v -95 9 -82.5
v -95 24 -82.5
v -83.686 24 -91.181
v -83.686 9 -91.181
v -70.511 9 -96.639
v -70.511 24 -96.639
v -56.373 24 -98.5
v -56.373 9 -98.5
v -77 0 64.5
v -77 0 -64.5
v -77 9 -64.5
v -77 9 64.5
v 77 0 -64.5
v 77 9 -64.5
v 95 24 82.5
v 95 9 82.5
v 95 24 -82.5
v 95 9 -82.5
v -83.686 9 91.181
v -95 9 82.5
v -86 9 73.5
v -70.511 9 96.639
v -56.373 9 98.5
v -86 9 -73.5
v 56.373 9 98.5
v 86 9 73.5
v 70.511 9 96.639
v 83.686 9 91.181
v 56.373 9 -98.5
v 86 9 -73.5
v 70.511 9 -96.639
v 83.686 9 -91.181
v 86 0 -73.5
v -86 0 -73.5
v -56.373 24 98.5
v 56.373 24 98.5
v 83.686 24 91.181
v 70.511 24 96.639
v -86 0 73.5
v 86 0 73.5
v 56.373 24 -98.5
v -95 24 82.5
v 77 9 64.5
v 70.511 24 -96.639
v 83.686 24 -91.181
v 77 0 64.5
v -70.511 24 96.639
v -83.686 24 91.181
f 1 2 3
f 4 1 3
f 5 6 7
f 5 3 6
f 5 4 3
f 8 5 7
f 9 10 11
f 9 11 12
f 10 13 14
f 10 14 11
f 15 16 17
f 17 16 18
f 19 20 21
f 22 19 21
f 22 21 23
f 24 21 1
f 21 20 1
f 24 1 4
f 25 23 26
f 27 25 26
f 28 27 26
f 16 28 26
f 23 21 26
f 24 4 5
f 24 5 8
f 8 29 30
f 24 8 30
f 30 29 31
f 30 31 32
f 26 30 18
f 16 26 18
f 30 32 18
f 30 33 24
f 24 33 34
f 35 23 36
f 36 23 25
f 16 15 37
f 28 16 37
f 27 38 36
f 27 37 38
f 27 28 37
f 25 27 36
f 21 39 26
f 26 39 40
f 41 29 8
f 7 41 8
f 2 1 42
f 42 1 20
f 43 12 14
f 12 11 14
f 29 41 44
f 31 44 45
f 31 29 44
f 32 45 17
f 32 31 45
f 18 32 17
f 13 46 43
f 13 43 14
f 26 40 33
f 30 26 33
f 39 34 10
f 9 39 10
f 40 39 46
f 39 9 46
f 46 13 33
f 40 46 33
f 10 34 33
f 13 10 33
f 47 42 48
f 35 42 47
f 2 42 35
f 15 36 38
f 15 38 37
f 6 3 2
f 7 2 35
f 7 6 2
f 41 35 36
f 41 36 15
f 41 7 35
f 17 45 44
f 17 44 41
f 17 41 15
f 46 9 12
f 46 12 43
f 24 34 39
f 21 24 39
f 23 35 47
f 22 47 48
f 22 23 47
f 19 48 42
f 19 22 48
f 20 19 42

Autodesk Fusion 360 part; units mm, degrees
sketch "Sketch1" plane through (0, 0, 0) normal (0, 1, 0) x (1, 0, 0)
  line L0 (86, 73.5) -> (-86, 73.5)
  line L1 (-86, 73.5) -> (-86, -73.5)
  line L2 (-86, -73.5) -> (86, -73.5)
  line L3 (86, -73.5) -> (86, 73.5)
  line L4 (86, 73.5) -> (-86, -73.5) construction
  line L5 (-86, 73.5) -> (86, -73.5) construction
  line L6 (-77, -64.5) -> (77, -64.5)
  line L7 (77, -64.5) -> (77, 64.5)
  line L8 (77, 64.5) -> (-77, 64.5)
  line L9 (-77, 64.5) -> (-77, -64.5)
  line L10 (102, -89.5) -> (102, 89.5)
  line L11 (102, 89.5) -> (-102, 89.5)
  line L12 (-102, 89.5) -> (-102, -89.5)
  line L13 (-102, -89.5) -> (102, -89.5)
  dimension "d1" = 172
  dimension "d6" = 147
  dimension "d15" = 16
extrude "Extrude1" add sketch "Sketch1" along normal blind 9 contours L0 L1 L2 L3
ref_plane "WorkPlane1" through (0, 9, 0) normal (0, 1, 0) x (0, 0, 1)
sketch "Sketch2" plane through (0, 9, 0) normal (0, 1, 0) x (1, 0, 0)
  line L0 (-77, -64.5) -> (-77, 64.5)
  line L1 (-77, 64.5) -> (77, 64.5)
  line L2 (77, 64.5) -> (77, -64.5)
  line L3 (77, -64.5) -> (-77, -64.5)
  line L4 (86, -73.5) -> (86, 73.5)
  line L5 (86, 73.5) -> (-86, 73.5)
  line L6 (-86, 73.5) -> (-86, -73.5)
  line L7 (-86, -73.5) -> (86, -73.5)
  line L8 (95, -82.5) -> (95, 82.5)
  line L9 (95, 82.5) -> (-95, 82.5)
  line L10 (-95, 82.5) -> (-95, -82.5)
  line L11 (-95, -82.5) -> (95, -82.5)
  line L12 (-111, -98.5) -> (111, -98.5)
  line L13 (111, -98.5) -> (111, 98.5)
  line L14 (111, 98.5) -> (-111, 98.5)
  line L15 (-111, 98.5) -> (-111, -98.5)
  arc A0 (-56.3726, 98.5) -> (-111, 43.8726) centre (-56.3726, 43.8726) ccw
  arc A1 (-111, -43.8726) -> (-56.3726, -98.5) centre (-56.3726, -43.8726) ccw
  arc A2 (56.3726, -98.5) -> (111, -43.8726) centre (56.3726, -43.8726) ccw
  arc A3 (111, 43.8726) -> (56.3726, 98.5) centre (56.3726, 43.8726) ccw
  dimension "d11" = 9
  dimension "d16" = 25
extrude "Extrude2" add sketch "Sketch2" along normal blind 15 contours L0 L1 L2 L3 | L4 L5 L6 L7 | L8 L9 L10 L11 | L11 L12 A1 A2 | L9 L14 A0 A3
equation "d1 = CaseLength - 2 * SideWidth"
equation "CaseLength = 190 mm"
equation "CaseWidth = 165 mm"
equation "SideWidth = 9 mm"
equation "PanelHeight = 15 mm"
equation "d6 = CaseWidth - 2 * SideWidth"
equation "d7 = -SideWidth"
equation "d8 = SideWidth"
equation "d10 = SideWidth"
equation "d11 = SideWidth"
equation "d12 = PanelHeight"
equation "FlangeWidth = 16 mm"
equation "d15 = FlangeWidth"
equation "d16 = SideWidth + FlangeWidth"
